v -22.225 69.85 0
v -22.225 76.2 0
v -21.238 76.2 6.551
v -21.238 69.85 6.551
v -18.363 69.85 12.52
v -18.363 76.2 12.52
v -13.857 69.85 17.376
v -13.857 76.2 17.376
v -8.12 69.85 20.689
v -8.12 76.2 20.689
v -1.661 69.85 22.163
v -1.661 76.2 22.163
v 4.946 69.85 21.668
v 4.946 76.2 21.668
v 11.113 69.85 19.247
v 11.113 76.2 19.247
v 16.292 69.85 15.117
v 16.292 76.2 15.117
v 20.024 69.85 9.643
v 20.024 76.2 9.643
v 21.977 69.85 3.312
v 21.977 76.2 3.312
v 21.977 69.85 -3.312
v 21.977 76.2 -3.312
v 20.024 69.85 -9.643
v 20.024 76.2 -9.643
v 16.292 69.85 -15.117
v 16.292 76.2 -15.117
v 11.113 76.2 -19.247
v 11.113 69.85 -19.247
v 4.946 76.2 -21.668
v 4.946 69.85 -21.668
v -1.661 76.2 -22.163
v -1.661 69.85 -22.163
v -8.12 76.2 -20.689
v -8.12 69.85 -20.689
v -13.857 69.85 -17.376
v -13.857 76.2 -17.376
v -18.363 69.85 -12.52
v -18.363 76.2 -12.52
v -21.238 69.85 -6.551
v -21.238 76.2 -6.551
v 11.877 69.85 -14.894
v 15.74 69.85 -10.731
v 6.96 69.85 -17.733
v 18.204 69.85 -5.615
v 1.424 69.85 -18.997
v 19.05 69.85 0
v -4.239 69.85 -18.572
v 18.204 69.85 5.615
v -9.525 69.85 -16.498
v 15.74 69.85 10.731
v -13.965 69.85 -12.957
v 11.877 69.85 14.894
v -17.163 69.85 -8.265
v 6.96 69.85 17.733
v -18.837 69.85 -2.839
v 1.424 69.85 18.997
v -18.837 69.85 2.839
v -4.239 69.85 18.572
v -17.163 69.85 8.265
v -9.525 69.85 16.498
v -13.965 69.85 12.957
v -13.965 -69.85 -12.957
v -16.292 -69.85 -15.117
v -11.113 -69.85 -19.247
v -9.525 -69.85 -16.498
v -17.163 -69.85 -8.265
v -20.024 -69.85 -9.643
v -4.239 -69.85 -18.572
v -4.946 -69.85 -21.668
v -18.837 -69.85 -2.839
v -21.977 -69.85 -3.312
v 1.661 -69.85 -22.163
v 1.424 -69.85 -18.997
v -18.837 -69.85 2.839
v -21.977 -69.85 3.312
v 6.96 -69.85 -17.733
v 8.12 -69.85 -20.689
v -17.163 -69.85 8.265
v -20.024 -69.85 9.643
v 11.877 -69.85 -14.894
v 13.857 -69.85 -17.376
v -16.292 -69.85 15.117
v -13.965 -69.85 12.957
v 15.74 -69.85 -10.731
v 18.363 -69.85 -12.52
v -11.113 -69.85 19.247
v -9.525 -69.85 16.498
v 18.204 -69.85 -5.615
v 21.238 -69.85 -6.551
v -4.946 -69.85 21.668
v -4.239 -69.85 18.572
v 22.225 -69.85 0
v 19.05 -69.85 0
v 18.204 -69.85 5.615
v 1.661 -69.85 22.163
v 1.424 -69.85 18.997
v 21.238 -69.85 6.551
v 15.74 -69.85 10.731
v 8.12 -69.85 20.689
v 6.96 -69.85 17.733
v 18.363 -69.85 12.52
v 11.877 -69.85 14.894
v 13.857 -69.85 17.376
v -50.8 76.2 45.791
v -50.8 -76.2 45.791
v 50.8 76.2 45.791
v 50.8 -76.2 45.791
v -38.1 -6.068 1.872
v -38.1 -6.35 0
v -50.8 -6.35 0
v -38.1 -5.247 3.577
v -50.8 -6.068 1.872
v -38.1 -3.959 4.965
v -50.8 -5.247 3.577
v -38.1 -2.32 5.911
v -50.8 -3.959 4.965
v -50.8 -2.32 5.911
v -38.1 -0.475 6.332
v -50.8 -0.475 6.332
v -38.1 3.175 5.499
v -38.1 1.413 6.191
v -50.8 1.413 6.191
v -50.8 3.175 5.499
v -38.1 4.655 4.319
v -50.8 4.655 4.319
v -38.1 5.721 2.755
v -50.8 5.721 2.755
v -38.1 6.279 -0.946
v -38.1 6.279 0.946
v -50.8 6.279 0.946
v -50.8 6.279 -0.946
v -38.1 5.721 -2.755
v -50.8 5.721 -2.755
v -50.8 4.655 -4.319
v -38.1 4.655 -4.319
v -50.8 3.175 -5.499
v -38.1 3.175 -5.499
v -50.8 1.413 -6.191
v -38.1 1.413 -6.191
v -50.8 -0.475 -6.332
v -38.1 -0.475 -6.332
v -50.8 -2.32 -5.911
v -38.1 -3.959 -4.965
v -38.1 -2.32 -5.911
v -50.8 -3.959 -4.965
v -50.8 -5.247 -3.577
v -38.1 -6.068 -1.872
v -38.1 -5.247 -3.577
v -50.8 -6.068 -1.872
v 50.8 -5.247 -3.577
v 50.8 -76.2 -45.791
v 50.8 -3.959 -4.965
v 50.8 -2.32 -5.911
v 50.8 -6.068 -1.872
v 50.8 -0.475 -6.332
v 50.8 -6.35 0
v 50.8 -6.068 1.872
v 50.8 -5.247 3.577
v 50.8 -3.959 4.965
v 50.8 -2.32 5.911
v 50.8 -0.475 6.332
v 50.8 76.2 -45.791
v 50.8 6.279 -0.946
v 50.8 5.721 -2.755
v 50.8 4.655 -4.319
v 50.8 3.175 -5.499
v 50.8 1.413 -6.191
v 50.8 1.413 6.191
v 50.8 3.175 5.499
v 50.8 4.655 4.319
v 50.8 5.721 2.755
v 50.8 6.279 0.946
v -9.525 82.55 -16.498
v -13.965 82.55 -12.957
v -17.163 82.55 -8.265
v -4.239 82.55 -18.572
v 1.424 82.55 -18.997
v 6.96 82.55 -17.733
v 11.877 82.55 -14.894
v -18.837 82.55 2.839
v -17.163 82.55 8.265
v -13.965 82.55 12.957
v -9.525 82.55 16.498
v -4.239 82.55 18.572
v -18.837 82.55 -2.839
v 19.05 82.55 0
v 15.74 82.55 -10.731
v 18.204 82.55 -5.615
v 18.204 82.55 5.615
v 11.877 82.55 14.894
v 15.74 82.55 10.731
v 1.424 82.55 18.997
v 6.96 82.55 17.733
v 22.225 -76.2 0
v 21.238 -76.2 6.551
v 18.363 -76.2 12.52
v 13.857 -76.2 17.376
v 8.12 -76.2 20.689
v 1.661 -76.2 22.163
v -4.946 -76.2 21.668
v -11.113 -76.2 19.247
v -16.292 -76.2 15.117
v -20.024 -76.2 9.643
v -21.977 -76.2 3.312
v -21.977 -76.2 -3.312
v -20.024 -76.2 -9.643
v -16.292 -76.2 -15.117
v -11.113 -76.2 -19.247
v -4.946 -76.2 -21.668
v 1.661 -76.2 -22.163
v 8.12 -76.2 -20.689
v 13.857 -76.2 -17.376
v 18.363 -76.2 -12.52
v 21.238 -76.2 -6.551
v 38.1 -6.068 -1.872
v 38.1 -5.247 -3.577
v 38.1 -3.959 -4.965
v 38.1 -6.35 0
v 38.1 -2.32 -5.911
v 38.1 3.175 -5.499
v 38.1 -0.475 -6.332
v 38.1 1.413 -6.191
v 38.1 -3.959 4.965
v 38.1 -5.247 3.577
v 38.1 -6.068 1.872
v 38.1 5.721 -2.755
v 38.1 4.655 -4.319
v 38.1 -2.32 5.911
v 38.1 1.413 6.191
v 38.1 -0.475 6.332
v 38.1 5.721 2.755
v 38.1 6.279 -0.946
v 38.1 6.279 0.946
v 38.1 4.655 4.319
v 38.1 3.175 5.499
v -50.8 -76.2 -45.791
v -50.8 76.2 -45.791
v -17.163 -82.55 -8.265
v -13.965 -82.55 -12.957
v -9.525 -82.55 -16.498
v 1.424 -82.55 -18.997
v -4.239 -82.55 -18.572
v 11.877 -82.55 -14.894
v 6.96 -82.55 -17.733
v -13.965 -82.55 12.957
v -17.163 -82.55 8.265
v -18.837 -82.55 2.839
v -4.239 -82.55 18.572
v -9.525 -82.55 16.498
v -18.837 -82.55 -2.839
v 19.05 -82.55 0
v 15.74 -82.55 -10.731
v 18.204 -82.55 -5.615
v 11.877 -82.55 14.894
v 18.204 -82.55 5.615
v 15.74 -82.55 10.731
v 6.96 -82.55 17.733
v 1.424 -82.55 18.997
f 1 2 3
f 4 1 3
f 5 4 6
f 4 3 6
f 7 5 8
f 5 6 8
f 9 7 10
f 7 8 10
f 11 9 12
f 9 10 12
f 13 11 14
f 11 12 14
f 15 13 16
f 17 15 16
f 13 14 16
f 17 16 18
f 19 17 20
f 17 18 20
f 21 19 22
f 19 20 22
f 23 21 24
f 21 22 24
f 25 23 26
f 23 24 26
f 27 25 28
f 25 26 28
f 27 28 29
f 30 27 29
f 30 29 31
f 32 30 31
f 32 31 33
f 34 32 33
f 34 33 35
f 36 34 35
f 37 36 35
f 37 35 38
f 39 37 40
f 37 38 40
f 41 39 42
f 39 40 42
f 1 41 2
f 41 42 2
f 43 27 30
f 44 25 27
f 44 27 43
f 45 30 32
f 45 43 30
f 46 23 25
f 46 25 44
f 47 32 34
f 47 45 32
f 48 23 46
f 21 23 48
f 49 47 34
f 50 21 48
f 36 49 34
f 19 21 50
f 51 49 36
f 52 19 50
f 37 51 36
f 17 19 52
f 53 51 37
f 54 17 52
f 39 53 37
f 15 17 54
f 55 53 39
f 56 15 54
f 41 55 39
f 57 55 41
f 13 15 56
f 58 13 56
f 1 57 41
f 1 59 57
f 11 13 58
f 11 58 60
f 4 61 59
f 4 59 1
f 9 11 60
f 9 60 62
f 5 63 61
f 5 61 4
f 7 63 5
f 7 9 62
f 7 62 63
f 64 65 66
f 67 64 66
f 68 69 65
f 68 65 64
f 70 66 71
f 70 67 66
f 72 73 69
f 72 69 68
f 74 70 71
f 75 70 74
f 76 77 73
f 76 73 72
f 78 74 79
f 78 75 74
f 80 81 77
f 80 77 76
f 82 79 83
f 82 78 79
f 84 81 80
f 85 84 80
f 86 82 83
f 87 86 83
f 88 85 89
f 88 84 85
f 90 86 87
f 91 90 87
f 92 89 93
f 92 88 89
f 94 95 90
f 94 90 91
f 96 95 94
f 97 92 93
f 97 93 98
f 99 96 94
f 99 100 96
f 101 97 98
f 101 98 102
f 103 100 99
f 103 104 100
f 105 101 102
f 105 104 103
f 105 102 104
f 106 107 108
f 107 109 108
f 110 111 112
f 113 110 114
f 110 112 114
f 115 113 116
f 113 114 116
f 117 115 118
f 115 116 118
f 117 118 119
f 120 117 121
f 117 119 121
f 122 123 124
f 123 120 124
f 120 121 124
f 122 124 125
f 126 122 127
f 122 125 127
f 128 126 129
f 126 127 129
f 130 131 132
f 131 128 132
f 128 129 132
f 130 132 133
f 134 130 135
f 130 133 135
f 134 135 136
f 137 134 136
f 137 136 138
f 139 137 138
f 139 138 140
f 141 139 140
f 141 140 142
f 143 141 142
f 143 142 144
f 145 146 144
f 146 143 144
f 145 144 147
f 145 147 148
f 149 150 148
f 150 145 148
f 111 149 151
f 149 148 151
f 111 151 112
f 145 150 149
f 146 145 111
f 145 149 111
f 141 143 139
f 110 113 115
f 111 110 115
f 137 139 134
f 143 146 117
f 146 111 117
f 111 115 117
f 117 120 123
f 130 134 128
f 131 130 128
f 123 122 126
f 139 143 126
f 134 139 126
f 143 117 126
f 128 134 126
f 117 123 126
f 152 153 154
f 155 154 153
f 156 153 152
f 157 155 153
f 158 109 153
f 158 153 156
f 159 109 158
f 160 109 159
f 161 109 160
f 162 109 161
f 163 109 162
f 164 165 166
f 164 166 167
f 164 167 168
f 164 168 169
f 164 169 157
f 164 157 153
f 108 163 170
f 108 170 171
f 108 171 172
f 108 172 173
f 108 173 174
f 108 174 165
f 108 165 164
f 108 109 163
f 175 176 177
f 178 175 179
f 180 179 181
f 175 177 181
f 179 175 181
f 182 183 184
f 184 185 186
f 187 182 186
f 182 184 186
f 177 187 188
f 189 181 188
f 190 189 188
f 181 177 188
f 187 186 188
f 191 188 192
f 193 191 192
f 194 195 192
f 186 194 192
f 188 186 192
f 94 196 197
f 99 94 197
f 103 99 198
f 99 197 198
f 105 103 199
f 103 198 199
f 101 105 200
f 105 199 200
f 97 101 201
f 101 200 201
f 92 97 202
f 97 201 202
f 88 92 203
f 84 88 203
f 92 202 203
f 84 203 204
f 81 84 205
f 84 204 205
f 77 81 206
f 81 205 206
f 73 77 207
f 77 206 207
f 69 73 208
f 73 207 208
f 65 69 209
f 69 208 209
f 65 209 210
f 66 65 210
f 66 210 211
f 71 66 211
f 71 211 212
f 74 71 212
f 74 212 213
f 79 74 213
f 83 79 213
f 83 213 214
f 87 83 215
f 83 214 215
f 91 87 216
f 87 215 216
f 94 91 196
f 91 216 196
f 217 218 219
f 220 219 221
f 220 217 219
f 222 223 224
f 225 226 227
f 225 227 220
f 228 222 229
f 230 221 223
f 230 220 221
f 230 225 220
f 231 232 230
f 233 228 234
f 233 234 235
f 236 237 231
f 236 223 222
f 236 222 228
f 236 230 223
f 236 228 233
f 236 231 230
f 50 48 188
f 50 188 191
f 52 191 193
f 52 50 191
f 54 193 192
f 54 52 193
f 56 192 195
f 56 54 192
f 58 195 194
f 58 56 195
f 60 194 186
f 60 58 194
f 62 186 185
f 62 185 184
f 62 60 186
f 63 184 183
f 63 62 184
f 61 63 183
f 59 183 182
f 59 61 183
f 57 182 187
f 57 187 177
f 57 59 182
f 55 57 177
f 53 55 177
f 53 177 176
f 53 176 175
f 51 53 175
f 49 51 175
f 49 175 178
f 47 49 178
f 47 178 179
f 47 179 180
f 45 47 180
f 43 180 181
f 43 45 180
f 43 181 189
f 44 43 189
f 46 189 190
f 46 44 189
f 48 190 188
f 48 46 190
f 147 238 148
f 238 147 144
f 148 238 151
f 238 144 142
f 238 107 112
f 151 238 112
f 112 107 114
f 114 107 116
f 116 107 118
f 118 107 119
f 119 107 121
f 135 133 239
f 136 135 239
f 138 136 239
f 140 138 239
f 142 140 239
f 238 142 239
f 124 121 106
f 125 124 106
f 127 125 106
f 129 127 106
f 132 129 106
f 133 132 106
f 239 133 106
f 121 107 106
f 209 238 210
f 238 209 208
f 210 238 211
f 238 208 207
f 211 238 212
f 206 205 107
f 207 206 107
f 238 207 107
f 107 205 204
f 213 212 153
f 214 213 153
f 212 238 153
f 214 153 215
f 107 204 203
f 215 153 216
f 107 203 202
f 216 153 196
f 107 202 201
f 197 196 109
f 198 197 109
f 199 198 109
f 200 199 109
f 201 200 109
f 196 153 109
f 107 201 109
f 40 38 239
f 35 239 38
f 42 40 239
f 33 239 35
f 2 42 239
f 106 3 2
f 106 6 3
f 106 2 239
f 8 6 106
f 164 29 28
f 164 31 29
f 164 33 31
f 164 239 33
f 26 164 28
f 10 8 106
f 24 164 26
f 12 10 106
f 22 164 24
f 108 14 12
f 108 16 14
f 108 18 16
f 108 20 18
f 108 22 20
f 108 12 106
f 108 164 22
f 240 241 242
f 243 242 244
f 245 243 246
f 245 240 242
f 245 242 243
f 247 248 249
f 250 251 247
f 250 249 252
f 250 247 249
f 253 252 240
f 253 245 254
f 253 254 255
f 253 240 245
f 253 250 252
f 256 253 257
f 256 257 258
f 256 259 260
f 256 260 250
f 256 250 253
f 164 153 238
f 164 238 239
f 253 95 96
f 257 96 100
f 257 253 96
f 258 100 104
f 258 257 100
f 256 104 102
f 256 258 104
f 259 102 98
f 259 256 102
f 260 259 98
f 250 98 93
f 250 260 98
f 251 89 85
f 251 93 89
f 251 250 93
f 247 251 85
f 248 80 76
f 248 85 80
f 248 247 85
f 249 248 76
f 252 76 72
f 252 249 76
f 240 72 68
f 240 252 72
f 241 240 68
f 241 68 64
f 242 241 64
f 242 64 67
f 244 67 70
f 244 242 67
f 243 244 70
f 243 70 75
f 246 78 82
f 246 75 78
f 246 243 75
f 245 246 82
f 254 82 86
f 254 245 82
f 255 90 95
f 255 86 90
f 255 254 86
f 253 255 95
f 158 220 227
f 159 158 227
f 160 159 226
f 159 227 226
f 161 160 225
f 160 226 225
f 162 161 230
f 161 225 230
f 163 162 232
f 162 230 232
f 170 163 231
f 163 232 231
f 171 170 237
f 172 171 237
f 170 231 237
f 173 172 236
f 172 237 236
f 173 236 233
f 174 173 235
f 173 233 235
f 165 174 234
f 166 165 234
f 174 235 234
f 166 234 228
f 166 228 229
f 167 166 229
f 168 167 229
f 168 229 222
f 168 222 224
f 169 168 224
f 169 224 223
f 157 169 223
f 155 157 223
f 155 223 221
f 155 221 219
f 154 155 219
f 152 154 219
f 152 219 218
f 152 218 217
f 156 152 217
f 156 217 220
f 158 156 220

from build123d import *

# Parameters (mm, degrees)
F0_W      = 152.4
F0_H      = 91.581002
F1_DEPTH  = 50.8
F2_R      = 19.05
F3_DEPTH  = 152.4
F2_R_2    = 22.225
F4_DEPTH  = 6.35
F5_R      = 22.225
F5_R_2    = 19.05
F6_DEPTH  = 6.35
F7_R      = 19.05
F8_DEPTH  = 82.55
F10_R     = 6.35
F11_DEPTH = 152.4
F12_R     = 6.35
F13_DEPTH = 38.1


with BuildPart() as f1:
    # F0 (on Right) → F1 (new body, symmetric)
    with BuildSketch(Plane.YZ):
        Rectangle(F0_W, F0_H)
    extrude(amount=F1_DEPTH, both=True)

    # F2 (on face) → F3 (cut, symmetric)
    with BuildSketch(Plane(origin=(0, 76.2, 0), x_dir=(-1, 0, 0), z_dir=(0, 1, 0))):
        Circle(F2_R)
    extrude(amount=F3_DEPTH, both=True, mode=Mode.SUBTRACT)

    # F2 (on face) → F4 (cut)
    with BuildSketch(Plane(origin=(0, 76.2, 0), x_dir=(-1, 0, 0), z_dir=(0, 1, 0))):
        Circle(F2_R_2)
        Circle(F2_R, mode=Mode.SUBTRACT)
    extrude(amount=-F4_DEPTH, mode=Mode.SUBTRACT)

    # F5 (on face) → F6 (cut)
    with BuildSketch(Plane.XZ.offset(76.2)):
        Circle(F5_R)
        Circle(F5_R_2, mode=Mode.SUBTRACT)
    extrude(amount=-F6_DEPTH, mode=Mode.SUBTRACT)

    # F7 (on Front) → F8 (join, symmetric)
    with BuildSketch(Plane.XZ):
        Circle(F7_R)
    extrude(amount=F8_DEPTH, both=True)

    # F10 (on face) → F11 (cut)
    with BuildSketch(Plane(origin=(-50.8, 0, 0), x_dir=(0, -1, 0), z_dir=(-1, 0, 0))):
        Circle(F10_R)
    extrude(amount=-F11_DEPTH, mode=Mode.SUBTRACT)

    # F12 (on Right) → F13 (join, symmetric)
    with BuildSketch(Plane.YZ):
        Circle(F12_R)
    extrude(amount=F13_DEPTH, both=True)


solid = f1.part
